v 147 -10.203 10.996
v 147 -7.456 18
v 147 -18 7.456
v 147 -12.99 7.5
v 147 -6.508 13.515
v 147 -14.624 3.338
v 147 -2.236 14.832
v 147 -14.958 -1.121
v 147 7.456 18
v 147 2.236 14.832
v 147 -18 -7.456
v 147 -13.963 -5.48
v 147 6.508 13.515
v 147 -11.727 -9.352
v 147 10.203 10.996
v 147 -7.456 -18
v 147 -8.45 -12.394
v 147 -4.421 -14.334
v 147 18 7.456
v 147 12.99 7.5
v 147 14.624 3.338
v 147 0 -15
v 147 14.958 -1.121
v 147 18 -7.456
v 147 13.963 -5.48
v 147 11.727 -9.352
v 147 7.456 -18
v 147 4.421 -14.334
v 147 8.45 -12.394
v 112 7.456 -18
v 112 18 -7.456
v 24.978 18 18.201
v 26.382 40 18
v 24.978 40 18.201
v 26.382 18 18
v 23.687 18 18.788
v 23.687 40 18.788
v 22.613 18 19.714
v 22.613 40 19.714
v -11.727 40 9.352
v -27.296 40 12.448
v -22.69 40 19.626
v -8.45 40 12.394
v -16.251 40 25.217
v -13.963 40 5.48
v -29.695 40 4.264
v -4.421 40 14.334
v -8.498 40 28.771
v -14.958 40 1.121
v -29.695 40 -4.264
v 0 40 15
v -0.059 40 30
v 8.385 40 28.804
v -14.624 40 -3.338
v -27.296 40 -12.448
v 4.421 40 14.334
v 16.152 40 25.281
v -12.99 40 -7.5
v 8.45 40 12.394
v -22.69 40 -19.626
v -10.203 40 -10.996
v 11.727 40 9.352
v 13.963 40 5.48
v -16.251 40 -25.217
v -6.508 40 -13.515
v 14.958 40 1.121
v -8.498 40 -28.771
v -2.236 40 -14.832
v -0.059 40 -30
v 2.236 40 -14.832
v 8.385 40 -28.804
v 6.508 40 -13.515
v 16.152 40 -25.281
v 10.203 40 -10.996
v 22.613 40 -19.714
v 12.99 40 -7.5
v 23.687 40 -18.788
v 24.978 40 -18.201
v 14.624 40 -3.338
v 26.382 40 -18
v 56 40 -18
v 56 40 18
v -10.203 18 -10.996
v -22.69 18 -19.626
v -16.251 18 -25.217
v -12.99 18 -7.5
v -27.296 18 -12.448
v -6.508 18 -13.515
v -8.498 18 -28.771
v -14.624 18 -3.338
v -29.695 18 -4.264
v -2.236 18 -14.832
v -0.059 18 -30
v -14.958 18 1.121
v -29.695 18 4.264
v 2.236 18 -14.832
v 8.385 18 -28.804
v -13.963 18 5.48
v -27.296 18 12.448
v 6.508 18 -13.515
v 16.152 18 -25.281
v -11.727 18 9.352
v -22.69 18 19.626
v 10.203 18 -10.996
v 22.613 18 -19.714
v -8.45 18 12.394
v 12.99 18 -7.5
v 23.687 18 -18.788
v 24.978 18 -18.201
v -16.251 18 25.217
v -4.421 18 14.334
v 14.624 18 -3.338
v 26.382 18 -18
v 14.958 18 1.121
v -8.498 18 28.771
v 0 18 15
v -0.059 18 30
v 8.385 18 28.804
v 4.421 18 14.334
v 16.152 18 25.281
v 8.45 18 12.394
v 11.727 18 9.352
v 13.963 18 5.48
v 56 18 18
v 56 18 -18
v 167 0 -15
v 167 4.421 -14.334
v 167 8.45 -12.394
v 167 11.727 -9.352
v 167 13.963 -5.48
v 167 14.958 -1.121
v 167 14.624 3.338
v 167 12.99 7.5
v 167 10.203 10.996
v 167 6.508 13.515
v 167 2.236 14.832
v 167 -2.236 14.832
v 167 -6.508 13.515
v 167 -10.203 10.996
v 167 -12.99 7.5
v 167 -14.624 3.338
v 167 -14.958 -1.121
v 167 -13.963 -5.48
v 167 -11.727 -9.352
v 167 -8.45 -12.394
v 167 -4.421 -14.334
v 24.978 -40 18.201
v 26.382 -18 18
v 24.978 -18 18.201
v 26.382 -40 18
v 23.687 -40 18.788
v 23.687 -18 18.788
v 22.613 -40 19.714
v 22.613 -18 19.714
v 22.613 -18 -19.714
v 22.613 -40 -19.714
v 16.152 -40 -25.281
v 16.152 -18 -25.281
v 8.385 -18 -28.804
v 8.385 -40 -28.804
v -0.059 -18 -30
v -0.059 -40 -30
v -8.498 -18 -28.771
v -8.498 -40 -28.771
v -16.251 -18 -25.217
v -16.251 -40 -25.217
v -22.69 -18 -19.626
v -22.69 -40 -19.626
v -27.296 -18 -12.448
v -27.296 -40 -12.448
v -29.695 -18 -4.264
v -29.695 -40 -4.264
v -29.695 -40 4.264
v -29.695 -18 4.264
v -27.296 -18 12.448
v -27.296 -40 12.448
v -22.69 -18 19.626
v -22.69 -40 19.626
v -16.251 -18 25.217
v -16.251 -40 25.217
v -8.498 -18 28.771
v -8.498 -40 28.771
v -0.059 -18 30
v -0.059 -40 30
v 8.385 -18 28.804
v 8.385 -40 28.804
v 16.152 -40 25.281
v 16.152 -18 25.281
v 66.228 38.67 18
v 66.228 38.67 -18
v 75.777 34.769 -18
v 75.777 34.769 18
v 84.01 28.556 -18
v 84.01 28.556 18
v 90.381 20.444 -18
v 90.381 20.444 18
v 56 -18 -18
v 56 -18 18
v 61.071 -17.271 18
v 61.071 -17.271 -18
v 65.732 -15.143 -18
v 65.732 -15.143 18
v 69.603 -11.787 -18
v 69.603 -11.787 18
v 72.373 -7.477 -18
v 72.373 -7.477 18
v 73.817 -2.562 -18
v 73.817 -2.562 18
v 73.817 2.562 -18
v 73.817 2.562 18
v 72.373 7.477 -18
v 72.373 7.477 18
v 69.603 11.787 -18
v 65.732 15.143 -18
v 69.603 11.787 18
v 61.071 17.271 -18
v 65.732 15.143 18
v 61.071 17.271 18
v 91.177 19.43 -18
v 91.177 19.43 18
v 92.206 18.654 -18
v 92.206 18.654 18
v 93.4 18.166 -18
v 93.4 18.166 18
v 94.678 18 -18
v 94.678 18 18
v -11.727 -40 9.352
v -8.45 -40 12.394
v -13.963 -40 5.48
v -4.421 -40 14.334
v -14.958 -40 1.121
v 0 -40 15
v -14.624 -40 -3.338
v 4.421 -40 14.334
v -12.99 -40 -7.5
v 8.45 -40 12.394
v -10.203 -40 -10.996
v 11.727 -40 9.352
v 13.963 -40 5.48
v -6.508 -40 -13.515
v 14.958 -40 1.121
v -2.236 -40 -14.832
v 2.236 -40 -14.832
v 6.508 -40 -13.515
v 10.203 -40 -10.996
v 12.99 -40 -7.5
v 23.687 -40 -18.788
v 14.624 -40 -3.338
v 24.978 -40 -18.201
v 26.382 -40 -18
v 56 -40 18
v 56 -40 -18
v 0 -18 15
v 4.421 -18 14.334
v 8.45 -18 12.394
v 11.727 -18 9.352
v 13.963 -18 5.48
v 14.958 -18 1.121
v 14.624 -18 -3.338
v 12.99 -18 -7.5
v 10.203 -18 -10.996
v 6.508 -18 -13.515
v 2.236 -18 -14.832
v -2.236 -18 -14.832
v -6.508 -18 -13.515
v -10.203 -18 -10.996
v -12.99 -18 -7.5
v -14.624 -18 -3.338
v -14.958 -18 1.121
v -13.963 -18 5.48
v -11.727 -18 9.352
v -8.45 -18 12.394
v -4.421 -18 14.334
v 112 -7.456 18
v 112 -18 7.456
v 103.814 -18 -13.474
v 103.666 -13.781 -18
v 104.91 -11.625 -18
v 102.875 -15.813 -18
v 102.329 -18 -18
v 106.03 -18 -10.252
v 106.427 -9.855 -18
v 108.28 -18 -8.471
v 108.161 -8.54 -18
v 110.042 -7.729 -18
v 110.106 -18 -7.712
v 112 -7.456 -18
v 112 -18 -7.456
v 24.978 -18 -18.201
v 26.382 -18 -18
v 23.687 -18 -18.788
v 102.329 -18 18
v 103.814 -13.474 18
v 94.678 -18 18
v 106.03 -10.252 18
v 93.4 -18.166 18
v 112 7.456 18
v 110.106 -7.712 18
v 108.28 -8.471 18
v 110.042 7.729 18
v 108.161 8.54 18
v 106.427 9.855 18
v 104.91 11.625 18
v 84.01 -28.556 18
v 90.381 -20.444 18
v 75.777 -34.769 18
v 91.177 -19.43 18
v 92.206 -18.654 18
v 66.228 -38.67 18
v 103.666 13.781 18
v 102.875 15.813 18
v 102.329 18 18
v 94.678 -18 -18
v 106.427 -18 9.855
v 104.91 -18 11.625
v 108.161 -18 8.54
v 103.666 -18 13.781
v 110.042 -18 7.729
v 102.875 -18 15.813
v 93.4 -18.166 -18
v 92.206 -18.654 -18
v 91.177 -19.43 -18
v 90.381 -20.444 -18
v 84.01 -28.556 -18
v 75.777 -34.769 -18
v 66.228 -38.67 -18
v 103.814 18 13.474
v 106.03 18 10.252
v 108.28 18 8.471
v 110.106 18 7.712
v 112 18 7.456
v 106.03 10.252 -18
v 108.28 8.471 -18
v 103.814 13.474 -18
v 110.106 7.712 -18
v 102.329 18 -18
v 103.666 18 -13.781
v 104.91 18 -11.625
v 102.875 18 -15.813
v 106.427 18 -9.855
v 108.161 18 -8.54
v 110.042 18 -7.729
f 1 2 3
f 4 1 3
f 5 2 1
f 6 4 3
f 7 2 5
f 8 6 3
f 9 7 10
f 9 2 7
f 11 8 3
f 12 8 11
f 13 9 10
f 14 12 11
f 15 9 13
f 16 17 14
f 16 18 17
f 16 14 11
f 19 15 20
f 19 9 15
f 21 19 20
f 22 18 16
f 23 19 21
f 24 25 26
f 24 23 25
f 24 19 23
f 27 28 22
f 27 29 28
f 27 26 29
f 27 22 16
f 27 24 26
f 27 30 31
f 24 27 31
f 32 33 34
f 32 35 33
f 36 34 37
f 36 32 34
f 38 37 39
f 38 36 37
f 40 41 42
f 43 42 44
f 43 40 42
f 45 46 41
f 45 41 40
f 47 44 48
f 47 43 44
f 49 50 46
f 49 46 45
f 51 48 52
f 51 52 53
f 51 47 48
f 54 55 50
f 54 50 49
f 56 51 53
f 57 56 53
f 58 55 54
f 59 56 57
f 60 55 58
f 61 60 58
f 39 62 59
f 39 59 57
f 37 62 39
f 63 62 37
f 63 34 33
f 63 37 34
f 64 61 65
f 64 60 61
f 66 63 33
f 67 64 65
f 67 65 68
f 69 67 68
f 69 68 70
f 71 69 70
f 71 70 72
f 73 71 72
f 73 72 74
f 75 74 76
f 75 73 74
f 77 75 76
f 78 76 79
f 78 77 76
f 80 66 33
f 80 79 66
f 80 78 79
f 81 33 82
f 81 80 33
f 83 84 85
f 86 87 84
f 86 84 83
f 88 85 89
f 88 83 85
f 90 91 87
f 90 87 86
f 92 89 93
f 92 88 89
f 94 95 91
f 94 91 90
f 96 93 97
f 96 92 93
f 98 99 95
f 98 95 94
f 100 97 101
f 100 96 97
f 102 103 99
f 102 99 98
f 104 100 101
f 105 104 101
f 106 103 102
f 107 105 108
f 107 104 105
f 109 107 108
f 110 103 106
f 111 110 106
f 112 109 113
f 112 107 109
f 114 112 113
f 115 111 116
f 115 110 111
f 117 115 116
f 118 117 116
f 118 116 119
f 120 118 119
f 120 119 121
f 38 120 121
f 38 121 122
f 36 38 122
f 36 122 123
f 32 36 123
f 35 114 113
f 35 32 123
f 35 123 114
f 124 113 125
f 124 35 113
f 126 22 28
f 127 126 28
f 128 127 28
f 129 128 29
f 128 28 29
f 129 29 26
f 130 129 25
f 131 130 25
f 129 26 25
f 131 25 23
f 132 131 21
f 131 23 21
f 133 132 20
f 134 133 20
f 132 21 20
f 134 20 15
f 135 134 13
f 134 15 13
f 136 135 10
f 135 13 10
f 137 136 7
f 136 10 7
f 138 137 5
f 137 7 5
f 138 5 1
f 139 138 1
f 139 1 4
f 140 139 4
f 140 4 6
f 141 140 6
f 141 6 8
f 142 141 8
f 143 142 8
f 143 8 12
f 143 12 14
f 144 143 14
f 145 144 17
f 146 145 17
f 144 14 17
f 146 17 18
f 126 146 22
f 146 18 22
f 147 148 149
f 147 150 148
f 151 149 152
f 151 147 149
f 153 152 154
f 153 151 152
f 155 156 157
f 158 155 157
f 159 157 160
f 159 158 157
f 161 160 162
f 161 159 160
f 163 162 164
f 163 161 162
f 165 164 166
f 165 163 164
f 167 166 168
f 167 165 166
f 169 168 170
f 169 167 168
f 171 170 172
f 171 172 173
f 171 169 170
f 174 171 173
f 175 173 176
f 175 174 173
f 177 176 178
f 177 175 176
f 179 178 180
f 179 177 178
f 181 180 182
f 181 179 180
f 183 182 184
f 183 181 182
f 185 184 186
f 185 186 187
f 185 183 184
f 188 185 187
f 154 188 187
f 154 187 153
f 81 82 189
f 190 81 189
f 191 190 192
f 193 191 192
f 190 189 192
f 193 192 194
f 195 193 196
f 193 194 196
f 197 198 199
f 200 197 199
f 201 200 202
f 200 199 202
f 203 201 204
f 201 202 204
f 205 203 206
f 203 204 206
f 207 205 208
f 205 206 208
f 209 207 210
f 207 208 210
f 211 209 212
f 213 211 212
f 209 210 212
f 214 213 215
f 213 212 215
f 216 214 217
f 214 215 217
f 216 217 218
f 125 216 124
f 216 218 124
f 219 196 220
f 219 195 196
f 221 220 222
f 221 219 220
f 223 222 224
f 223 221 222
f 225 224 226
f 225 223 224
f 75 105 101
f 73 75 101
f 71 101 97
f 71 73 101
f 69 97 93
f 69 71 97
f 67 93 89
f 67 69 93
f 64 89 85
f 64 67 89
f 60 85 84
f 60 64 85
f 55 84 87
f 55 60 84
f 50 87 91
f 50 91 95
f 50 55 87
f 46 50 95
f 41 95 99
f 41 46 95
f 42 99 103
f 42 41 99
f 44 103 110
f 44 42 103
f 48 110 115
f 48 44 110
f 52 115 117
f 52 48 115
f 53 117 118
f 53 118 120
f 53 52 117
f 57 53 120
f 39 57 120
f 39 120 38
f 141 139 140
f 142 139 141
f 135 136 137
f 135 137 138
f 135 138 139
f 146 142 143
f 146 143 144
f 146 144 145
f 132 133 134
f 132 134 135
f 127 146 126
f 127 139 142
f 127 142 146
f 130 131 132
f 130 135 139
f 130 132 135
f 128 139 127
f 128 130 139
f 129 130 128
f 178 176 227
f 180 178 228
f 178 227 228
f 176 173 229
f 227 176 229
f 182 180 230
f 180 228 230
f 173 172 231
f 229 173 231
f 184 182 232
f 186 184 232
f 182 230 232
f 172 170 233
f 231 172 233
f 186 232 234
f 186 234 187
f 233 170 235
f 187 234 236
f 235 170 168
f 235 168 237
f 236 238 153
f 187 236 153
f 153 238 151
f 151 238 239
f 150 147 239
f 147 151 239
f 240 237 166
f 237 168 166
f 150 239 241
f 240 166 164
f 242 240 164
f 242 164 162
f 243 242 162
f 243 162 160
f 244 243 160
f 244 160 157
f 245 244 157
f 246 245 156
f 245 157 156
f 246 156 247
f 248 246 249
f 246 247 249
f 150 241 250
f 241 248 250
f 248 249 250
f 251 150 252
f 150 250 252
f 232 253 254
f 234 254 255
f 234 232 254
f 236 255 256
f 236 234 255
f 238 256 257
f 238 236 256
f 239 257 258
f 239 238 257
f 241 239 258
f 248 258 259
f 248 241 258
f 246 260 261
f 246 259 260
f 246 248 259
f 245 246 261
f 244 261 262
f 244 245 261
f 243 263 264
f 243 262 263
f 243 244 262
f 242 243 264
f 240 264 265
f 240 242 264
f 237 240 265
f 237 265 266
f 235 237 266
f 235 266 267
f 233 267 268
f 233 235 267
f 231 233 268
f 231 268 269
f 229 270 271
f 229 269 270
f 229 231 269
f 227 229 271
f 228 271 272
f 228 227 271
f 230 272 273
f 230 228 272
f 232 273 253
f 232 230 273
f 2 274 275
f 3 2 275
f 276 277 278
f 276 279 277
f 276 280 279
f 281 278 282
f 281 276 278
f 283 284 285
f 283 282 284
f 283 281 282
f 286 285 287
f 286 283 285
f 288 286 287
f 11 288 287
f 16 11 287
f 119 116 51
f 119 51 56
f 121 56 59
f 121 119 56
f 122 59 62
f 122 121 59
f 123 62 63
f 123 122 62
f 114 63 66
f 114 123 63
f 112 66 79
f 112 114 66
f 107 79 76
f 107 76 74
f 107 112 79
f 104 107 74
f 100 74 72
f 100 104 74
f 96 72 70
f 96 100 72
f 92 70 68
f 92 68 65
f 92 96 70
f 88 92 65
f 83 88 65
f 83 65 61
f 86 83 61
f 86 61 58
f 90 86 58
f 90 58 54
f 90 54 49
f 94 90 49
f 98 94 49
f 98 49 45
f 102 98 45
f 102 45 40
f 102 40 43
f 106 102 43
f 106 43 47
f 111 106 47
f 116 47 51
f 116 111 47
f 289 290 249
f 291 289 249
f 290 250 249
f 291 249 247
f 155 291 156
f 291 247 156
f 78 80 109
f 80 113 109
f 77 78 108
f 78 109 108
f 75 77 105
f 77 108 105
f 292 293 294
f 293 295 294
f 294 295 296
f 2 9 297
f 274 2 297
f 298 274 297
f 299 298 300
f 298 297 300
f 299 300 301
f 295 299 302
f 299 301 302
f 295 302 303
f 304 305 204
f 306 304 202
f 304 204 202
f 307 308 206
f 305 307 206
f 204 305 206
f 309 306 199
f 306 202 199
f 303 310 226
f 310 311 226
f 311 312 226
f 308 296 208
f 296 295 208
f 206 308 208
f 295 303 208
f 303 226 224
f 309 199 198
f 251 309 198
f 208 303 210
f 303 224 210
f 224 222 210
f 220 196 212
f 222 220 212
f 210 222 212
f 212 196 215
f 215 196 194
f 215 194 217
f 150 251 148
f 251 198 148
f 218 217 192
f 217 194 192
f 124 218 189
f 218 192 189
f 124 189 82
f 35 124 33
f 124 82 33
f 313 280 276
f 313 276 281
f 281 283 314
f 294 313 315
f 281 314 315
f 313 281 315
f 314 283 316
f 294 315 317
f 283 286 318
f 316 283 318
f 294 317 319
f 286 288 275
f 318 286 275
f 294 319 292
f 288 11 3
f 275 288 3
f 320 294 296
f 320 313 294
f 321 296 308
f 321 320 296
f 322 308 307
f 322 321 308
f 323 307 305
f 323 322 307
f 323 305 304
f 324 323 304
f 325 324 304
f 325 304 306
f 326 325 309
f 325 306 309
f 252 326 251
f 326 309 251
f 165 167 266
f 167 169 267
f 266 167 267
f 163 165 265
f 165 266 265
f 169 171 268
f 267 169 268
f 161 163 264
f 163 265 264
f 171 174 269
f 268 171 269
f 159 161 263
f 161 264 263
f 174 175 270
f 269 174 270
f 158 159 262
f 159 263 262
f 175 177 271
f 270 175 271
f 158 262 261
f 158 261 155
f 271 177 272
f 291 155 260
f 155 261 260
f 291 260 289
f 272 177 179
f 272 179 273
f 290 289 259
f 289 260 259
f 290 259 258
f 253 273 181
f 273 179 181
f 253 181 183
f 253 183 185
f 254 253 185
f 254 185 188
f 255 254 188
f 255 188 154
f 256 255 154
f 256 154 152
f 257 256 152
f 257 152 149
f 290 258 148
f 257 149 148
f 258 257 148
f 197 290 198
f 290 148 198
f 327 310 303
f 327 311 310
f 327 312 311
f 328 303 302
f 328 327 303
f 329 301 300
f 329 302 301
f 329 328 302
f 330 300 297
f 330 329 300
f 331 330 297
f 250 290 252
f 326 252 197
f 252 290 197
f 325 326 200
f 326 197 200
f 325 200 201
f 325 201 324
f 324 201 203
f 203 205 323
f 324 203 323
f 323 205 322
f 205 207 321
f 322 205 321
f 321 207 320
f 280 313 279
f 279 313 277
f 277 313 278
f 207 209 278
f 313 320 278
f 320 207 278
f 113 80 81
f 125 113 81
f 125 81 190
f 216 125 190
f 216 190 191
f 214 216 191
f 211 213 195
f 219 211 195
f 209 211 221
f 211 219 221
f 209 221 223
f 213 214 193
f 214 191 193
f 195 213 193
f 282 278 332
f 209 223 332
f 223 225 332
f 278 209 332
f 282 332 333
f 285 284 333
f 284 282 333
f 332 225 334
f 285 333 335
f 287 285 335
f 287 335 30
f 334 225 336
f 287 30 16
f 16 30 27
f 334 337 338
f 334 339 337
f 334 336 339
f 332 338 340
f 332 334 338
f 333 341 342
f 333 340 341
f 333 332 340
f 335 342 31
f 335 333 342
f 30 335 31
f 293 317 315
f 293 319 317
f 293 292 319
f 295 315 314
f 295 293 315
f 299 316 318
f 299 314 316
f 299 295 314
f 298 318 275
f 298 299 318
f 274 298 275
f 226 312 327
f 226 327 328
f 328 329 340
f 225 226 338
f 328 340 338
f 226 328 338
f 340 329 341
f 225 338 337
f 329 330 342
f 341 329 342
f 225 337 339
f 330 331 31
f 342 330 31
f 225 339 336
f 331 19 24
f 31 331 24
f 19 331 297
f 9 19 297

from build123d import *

# Parameters (mm, degrees)
CROQUIS2_R              = 15
SALIENTE_EXTRUIR1_DEPTH = 40
CROQUIS3_W              = 99.474281043
CROQUIS3_H              = 36
CORTAR_EXTRUIR1_DEPTH   = 40
SALIENTE_EXTRUIR2_DEPTH = 36
SALIENTE_EXTRUIR3_DEPTH = 45
CROQUIS8_R              = 15
SALIENTE_EXTRUIR4_DEPTH = 20
REDONDEO1_R             = 10
REDONDEO2_R             = 5
REDONDEO3_R             = 5


with BuildPart() as part:
    # Croquis2 → Saliente-Extruir1 (new, symmetric)
    with BuildSketch(Plane(origin=(0, 0, 0), x_dir=(1, 0, 0), z_dir=(0, 1, 0))):
        with BuildLine():
            Line((24, -18), (56, -18))
            Line((56, -18), (56, 18))
            Line((56, 18), (24, 18))
            ThreePointArc((24, 18), (-30, 0), (24, -18))
        make_face()
        with Locations(Location((0, 0, 0), (0, 0, 270))):
            Circle(CROQUIS2_R, mode=Mode.SUBTRACT)
    extrude(amount=SALIENTE_EXTRUIR1_DEPTH, both=True)

    # Croquis3 → Cortar-Extruir1 (cut, symmetric)
    with BuildSketch(Plane.XY):
        with Locations((15.580182786, 0)):
            Rectangle(CROQUIS3_W, CROQUIS3_H)
    extrude(amount=CORTAR_EXTRUIR1_DEPTH, both=True, mode=Mode.SUBTRACT)


with BuildPart() as cortar_extruir1_piece_1:
    # of the separate pieces the step leaves, piece 1, a body of its own (cortar_extruir1_pieces)
    add(part.part.solids().sort_by_distance((24, -18, 18))[0])



with BuildPart() as cortar_extruir1_piece_2:
    # of the separate pieces the step leaves, piece 2, a body of its own (cortar_extruir1_pieces)
    add(part.part.solids().sort_by_distance((24, 40, 18))[0])


with BuildPart() as cortar_extruir1_piece_1_1:
    add(cortar_extruir1_piece_1.part)

    add(cortar_extruir1_piece_2.part)  # Saliente-Extruir2 merges Cortar-Extruir1 piece 2
    # Croquis5 → Saliente-Extruir2 (add)
    with BuildSketch(Plane.XY.offset(18)):
        with BuildLine():
            Line((91.721142199, 18), (102, 18))
            Line((102, 18), (102, -18))
            Line((102, -18), (91.721142199, -18))
            ThreePointArc((91.721142199, -18), (76.976176963, -34.058772732), (56, -40))
            Line((56, -40), (56, -18))
            ThreePointArc((56, -18), (74, 0), (56, 18))
            Line((56, 18), (56, 40))
            ThreePointArc((56, 40), (76.976176963, 34.058772732), (91.721142199, 18))
        make_face()
    extrude(amount=-SALIENTE_EXTRUIR2_DEPTH)

    # Croquis7 → Saliente-Extruir3 (add)
    with BuildSketch(Plane(origin=(102, 0, 0), x_dir=(0, 0, -1), z_dir=(1, 0, 0))):
        Polygon((-7.455844123, 18), (-18, 7.455844123), (-18, -7.455844123), (-7.455844123, -18), (7.455844123, -18), (18, -7.455844123), (18, 7.455844123), (7.455844123, 18), align=None)
    extrude(amount=SALIENTE_EXTRUIR3_DEPTH)

    # Croquis8 → Saliente-Extruir4 (add)
    with BuildSketch(Plane(origin=(147, 0, 0), x_dir=(0, 0, -1), z_dir=(1, 0, 0))):
        Circle(CROQUIS8_R)
    extrude(amount=SALIENTE_EXTRUIR4_DEPTH)

    # Redondeo1
    # the kernel refuses this fillet: 10 mm, written as the material it adds along each edge
    with BuildSketch(Plane(origin=(102, 35.67766953, -10.221825407), x_dir=(1, 0, 0), z_dir=(0, -0.7071067811865477, 0.7071067811865475))) as redondeo1_piece_1_section:
        with BuildLine():
            CenterArc((REDONDEO1_R, REDONDEO1_R), REDONDEO1_R, 180, 90)
            Line((0, REDONDEO1_R), (0, 0))
            Line((0, 0), (REDONDEO1_R, 0))
        make_face()
    redondeo1_piece_1 = extrude(amount=64.911688245, mode=Mode.PRIVATE)
    redondeo1_piece_1 = split(redondeo1_piece_1, bisect_by=Plane(origin=(104.775136412, 13.729156697, 18), z_dir=(0, 0, -1)), keep=Keep.TOP, mode=Mode.PRIVATE)
    redondeo1_piece_1 = split(redondeo1_piece_1, bisect_by=Plane(origin=(104.775136412, 18, 13.729156697), z_dir=(0, -1, 0)), keep=Keep.TOP, mode=Mode.PRIVATE)
    add(redondeo1_piece_1)
    with BuildSketch(Plane(origin=(102, -10.221825407, -35.67766953), x_dir=(1, 0, 0), z_dir=(0, 0.7071067811865475, 0.7071067811865476))) as redondeo1_piece_2_section:
        with BuildLine():
            CenterArc((REDONDEO1_R, REDONDEO1_R), REDONDEO1_R, 180, 90)
            Line((0, REDONDEO1_R), (0, 0))
            Line((0, 0), (REDONDEO1_R, 0))
        make_face()
    redondeo1_piece_2 = extrude(amount=64.911688245, mode=Mode.PRIVATE)
    redondeo1_piece_2 = split(redondeo1_piece_2, bisect_by=Plane(origin=(104.775136412, 18, -13.729156697), z_dir=(0, -1, 0)), keep=Keep.TOP, mode=Mode.PRIVATE)
    redondeo1_piece_2 = split(redondeo1_piece_2, bisect_by=Plane(origin=(104.775136412, 13.729156697, -18), z_dir=(0, 0, 1)), keep=Keep.TOP, mode=Mode.PRIVATE)
    add(redondeo1_piece_2)
    with BuildSketch(Plane(origin=(102, -35.67766953, 10.221825407), x_dir=(1, 0, 0), z_dir=(0, 0.7071067811865477, -0.7071067811865475))) as redondeo1_piece_3_section:
        with BuildLine():
            CenterArc((REDONDEO1_R, REDONDEO1_R), REDONDEO1_R, 180, 90)
            Line((0, REDONDEO1_R), (0, 0))
            Line((0, 0), (REDONDEO1_R, 0))
        make_face()
    redondeo1_piece_3 = extrude(amount=64.911688245, mode=Mode.PRIVATE)
    redondeo1_piece_3 = split(redondeo1_piece_3, bisect_by=Plane(origin=(104.775136412, -18, -13.729156697), z_dir=(0, 1, 0)), keep=Keep.TOP, mode=Mode.PRIVATE)
    redondeo1_piece_3 = split(redondeo1_piece_3, bisect_by=Plane(origin=(104.775136412, -13.729156697, -18), z_dir=(0, 0, 1)), keep=Keep.TOP, mode=Mode.PRIVATE)
    add(redondeo1_piece_3)
    with BuildSketch(Plane(origin=(102, 10.221825407, 35.67766953), x_dir=(0, -0.7071067811865476, 0.7071067811865476), z_dir=(0, -0.7071067811865476, -0.7071067811865476))) as redondeo1_piece_4_section:
        with BuildLine():
            CenterArc((REDONDEO1_R, -REDONDEO1_R), REDONDEO1_R, 90, 90)
            Line((0, -REDONDEO1_R), (0, 0))
            Line((0, 0), (REDONDEO1_R, 0))
        make_face()
    redondeo1_piece_4 = extrude(amount=64.911688245, mode=Mode.PRIVATE)
    redondeo1_piece_4 = split(redondeo1_piece_4, bisect_by=Plane(origin=(104.775136413, -13.729156697, 18), z_dir=(0, 0, -1)), keep=Keep.TOP, mode=Mode.PRIVATE)
    redondeo1_piece_4 = split(redondeo1_piece_4, bisect_by=Plane(origin=(104.775136413, -18, 13.729156697), z_dir=(0, 1, 0)), keep=Keep.TOP, mode=Mode.PRIVATE)
    add(redondeo1_piece_4)

    # Redondeo2
    redondeo2_edges = [cortar_extruir1_piece_1_1.edges().sort_by_distance(p)[0] for p in [
        (91.721142199, 18, 0),
        (91.721142199, -18, 0),
    ]]
    fillet(redondeo2_edges, radius=REDONDEO2_R)

    # Redondeo3
    redondeo3_edges = [cortar_extruir1_piece_1_1.edges().sort_by_distance(p)[0] for p in [
        (24, -29, 18),
        (24, -29, -18),
        (24, 29, -18),
        (24, 29, 18),
    ]]
    fillet(redondeo3_edges, radius=REDONDEO3_R)


solid = cortar_extruir1_piece_1_1.part
